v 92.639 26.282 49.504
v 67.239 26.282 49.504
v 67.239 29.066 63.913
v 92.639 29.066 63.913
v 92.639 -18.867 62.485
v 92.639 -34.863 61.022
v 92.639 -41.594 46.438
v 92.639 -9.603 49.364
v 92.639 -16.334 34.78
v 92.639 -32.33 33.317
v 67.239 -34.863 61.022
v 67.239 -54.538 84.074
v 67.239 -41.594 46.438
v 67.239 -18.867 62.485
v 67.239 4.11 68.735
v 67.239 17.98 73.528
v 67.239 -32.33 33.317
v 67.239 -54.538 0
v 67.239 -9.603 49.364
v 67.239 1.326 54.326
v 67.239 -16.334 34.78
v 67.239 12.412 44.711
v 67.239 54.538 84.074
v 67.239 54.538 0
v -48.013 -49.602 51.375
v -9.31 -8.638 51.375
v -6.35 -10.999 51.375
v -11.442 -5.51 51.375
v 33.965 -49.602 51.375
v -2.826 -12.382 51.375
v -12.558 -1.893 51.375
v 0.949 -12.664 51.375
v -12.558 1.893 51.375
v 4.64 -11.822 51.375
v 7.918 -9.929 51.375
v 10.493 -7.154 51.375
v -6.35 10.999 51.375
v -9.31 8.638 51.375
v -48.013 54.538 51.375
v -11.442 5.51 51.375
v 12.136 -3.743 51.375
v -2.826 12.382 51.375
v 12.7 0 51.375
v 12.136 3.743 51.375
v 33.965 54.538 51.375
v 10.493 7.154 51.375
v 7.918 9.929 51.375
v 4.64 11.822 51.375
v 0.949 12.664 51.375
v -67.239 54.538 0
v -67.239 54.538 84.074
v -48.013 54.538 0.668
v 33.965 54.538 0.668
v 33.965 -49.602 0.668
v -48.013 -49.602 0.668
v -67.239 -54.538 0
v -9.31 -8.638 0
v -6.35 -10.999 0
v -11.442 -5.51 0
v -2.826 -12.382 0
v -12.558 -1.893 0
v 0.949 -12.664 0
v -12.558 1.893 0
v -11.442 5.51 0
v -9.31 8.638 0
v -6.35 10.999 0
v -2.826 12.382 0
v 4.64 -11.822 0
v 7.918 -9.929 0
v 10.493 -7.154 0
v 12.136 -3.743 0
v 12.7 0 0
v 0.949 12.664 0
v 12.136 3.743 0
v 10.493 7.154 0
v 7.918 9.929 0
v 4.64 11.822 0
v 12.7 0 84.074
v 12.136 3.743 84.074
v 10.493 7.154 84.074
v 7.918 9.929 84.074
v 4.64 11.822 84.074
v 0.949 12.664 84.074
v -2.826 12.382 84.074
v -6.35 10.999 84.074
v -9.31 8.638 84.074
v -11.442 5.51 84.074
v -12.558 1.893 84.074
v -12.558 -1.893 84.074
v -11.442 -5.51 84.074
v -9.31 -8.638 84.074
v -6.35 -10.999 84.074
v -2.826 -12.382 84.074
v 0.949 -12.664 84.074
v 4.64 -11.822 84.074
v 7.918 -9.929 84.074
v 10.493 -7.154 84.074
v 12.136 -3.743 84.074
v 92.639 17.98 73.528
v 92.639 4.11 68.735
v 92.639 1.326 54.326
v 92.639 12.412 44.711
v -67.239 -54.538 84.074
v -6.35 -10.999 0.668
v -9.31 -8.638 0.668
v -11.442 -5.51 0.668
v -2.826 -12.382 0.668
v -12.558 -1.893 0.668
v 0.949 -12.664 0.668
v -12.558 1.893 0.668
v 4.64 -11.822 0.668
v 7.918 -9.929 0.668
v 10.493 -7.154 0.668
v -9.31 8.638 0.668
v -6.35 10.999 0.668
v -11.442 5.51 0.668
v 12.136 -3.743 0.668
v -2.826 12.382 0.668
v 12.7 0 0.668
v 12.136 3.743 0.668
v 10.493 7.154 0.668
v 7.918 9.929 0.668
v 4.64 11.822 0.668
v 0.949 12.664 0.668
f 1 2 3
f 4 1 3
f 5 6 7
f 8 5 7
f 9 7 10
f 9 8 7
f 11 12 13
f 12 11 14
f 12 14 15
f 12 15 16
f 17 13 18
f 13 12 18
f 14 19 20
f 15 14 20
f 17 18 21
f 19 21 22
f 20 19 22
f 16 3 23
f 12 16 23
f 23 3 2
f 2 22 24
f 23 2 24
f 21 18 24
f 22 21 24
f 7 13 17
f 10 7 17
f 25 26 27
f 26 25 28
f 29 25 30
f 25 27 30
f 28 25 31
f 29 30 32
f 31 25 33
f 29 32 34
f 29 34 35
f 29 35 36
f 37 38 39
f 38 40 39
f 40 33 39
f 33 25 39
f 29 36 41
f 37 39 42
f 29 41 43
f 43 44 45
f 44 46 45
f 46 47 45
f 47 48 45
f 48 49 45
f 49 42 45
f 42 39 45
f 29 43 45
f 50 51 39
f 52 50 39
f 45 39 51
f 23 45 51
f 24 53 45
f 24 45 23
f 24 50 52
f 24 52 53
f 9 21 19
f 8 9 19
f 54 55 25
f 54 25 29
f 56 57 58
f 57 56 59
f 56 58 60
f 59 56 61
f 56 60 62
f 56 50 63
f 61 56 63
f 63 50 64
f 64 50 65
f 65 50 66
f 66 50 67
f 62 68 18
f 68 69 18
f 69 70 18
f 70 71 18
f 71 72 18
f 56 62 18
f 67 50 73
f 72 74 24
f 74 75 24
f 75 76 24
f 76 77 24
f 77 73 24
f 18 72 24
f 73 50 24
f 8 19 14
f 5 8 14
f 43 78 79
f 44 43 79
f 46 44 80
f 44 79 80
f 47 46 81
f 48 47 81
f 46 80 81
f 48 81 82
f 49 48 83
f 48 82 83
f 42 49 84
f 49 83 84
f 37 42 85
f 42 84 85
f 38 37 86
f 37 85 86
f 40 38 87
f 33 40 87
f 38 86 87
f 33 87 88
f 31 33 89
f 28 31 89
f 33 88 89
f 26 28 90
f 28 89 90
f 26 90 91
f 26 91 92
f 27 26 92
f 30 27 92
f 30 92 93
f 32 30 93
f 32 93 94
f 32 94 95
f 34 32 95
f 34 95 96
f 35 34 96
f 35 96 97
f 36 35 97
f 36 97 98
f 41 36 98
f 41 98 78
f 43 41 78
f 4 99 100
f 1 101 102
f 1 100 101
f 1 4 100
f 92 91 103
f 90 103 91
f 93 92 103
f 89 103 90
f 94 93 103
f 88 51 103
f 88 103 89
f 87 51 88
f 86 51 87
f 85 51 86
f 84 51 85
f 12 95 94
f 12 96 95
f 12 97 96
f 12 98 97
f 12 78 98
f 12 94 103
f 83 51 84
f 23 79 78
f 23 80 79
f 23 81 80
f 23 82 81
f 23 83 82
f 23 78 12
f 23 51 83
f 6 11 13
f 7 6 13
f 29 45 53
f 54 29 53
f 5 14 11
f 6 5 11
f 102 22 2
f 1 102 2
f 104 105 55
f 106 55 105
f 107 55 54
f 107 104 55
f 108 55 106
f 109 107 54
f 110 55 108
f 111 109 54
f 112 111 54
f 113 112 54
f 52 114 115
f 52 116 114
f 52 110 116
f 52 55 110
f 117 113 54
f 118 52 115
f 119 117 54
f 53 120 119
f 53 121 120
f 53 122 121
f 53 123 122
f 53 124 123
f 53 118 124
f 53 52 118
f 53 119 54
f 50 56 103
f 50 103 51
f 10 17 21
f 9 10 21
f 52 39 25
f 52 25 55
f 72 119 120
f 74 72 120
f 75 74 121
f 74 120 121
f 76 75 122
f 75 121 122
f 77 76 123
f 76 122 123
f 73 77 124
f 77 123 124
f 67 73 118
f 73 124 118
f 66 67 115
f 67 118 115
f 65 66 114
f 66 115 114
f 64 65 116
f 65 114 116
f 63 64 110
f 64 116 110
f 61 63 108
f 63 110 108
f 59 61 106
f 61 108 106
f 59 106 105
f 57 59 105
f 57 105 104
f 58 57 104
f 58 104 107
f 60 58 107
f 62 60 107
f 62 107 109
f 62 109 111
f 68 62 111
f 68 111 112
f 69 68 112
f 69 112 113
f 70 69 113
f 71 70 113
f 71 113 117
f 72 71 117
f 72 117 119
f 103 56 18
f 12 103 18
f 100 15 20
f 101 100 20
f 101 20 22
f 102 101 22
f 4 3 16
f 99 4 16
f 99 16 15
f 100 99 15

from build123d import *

# Parameters (mm, degrees)
SKETCH2_W           = 134.477697302
SKETCH2_H           = 109.076354478
BOSS_EXTRUDE1_DEPTH = 84.074
SKETCH3_R           = 12.7
CUT_EXTRUDE1_DEPTH  = 127
SKETCH4_W           = 81.978128355
SKETCH4_H           = 50.707128689
CUT_EXTRUDE2_DEPTH  = 104.14
BOSS_EXTRUDE2_DEPTH = 25.4
BOSS_EXTRUDE3_DEPTH = 25.4


with BuildPart() as part:
    # Sketch2 → Boss-Extrude1 (new body)
    with BuildSketch(Plane.XY):
        Rectangle(SKETCH2_W, SKETCH2_H)
    extrude(amount=BOSS_EXTRUDE1_DEPTH)

    # Sketch3 → Cut-Extrude1 (cut)
    with BuildSketch(Plane.XY.offset(84.074)):
        Circle(SKETCH3_R)
    extrude(amount=-CUT_EXTRUDE1_DEPTH, mode=Mode.SUBTRACT)

    # Sketch4 → Cut-Extrude2 (cut)
    with BuildSketch(Plane(origin=(0, 54.538177239, 0), x_dir=(1, 0, 0), z_dir=(0, 1, 0))):
        with Locations((-7.023947617, -26.021677284)):
            Rectangle(SKETCH4_W, SKETCH4_H)
    extrude(amount=-CUT_EXTRUDE2_DEPTH, mode=Mode.SUBTRACT)

    # Sketch5 → Boss-Extrude2 (add)
    with BuildSketch(Plane(origin=(67.238848651, 0, 0), x_dir=(0, 0, -1), z_dir=(1, 0, 0))):
        Polygon((-54.326321663, 1.325818935), (-44.711130396, 12.412030691), (-49.504475775, 26.282136468), (-63.913012421, 29.06603049), (-73.528203689, 17.979818734), (-68.734858309, 4.109712956), align=None)
    extrude(amount=BOSS_EXTRUDE2_DEPTH)

    # Sketch6 → Boss-Extrude3 (add)
    with BuildSketch(Plane(origin=(67.238848651, 0, 0), x_dir=(0, 0, -1), z_dir=(1, 0, 0))):
        Polygon((-33.317190853, -32.329584791), (-34.779908073, -16.333922758), (-49.363916354, -9.602842013), (-62.485207415, -18.867423301), (-61.022490195, -34.863085333), (-46.438481914, -41.594166078), align=None)
    extrude(amount=BOSS_EXTRUDE3_DEPTH)


solid = part.part
